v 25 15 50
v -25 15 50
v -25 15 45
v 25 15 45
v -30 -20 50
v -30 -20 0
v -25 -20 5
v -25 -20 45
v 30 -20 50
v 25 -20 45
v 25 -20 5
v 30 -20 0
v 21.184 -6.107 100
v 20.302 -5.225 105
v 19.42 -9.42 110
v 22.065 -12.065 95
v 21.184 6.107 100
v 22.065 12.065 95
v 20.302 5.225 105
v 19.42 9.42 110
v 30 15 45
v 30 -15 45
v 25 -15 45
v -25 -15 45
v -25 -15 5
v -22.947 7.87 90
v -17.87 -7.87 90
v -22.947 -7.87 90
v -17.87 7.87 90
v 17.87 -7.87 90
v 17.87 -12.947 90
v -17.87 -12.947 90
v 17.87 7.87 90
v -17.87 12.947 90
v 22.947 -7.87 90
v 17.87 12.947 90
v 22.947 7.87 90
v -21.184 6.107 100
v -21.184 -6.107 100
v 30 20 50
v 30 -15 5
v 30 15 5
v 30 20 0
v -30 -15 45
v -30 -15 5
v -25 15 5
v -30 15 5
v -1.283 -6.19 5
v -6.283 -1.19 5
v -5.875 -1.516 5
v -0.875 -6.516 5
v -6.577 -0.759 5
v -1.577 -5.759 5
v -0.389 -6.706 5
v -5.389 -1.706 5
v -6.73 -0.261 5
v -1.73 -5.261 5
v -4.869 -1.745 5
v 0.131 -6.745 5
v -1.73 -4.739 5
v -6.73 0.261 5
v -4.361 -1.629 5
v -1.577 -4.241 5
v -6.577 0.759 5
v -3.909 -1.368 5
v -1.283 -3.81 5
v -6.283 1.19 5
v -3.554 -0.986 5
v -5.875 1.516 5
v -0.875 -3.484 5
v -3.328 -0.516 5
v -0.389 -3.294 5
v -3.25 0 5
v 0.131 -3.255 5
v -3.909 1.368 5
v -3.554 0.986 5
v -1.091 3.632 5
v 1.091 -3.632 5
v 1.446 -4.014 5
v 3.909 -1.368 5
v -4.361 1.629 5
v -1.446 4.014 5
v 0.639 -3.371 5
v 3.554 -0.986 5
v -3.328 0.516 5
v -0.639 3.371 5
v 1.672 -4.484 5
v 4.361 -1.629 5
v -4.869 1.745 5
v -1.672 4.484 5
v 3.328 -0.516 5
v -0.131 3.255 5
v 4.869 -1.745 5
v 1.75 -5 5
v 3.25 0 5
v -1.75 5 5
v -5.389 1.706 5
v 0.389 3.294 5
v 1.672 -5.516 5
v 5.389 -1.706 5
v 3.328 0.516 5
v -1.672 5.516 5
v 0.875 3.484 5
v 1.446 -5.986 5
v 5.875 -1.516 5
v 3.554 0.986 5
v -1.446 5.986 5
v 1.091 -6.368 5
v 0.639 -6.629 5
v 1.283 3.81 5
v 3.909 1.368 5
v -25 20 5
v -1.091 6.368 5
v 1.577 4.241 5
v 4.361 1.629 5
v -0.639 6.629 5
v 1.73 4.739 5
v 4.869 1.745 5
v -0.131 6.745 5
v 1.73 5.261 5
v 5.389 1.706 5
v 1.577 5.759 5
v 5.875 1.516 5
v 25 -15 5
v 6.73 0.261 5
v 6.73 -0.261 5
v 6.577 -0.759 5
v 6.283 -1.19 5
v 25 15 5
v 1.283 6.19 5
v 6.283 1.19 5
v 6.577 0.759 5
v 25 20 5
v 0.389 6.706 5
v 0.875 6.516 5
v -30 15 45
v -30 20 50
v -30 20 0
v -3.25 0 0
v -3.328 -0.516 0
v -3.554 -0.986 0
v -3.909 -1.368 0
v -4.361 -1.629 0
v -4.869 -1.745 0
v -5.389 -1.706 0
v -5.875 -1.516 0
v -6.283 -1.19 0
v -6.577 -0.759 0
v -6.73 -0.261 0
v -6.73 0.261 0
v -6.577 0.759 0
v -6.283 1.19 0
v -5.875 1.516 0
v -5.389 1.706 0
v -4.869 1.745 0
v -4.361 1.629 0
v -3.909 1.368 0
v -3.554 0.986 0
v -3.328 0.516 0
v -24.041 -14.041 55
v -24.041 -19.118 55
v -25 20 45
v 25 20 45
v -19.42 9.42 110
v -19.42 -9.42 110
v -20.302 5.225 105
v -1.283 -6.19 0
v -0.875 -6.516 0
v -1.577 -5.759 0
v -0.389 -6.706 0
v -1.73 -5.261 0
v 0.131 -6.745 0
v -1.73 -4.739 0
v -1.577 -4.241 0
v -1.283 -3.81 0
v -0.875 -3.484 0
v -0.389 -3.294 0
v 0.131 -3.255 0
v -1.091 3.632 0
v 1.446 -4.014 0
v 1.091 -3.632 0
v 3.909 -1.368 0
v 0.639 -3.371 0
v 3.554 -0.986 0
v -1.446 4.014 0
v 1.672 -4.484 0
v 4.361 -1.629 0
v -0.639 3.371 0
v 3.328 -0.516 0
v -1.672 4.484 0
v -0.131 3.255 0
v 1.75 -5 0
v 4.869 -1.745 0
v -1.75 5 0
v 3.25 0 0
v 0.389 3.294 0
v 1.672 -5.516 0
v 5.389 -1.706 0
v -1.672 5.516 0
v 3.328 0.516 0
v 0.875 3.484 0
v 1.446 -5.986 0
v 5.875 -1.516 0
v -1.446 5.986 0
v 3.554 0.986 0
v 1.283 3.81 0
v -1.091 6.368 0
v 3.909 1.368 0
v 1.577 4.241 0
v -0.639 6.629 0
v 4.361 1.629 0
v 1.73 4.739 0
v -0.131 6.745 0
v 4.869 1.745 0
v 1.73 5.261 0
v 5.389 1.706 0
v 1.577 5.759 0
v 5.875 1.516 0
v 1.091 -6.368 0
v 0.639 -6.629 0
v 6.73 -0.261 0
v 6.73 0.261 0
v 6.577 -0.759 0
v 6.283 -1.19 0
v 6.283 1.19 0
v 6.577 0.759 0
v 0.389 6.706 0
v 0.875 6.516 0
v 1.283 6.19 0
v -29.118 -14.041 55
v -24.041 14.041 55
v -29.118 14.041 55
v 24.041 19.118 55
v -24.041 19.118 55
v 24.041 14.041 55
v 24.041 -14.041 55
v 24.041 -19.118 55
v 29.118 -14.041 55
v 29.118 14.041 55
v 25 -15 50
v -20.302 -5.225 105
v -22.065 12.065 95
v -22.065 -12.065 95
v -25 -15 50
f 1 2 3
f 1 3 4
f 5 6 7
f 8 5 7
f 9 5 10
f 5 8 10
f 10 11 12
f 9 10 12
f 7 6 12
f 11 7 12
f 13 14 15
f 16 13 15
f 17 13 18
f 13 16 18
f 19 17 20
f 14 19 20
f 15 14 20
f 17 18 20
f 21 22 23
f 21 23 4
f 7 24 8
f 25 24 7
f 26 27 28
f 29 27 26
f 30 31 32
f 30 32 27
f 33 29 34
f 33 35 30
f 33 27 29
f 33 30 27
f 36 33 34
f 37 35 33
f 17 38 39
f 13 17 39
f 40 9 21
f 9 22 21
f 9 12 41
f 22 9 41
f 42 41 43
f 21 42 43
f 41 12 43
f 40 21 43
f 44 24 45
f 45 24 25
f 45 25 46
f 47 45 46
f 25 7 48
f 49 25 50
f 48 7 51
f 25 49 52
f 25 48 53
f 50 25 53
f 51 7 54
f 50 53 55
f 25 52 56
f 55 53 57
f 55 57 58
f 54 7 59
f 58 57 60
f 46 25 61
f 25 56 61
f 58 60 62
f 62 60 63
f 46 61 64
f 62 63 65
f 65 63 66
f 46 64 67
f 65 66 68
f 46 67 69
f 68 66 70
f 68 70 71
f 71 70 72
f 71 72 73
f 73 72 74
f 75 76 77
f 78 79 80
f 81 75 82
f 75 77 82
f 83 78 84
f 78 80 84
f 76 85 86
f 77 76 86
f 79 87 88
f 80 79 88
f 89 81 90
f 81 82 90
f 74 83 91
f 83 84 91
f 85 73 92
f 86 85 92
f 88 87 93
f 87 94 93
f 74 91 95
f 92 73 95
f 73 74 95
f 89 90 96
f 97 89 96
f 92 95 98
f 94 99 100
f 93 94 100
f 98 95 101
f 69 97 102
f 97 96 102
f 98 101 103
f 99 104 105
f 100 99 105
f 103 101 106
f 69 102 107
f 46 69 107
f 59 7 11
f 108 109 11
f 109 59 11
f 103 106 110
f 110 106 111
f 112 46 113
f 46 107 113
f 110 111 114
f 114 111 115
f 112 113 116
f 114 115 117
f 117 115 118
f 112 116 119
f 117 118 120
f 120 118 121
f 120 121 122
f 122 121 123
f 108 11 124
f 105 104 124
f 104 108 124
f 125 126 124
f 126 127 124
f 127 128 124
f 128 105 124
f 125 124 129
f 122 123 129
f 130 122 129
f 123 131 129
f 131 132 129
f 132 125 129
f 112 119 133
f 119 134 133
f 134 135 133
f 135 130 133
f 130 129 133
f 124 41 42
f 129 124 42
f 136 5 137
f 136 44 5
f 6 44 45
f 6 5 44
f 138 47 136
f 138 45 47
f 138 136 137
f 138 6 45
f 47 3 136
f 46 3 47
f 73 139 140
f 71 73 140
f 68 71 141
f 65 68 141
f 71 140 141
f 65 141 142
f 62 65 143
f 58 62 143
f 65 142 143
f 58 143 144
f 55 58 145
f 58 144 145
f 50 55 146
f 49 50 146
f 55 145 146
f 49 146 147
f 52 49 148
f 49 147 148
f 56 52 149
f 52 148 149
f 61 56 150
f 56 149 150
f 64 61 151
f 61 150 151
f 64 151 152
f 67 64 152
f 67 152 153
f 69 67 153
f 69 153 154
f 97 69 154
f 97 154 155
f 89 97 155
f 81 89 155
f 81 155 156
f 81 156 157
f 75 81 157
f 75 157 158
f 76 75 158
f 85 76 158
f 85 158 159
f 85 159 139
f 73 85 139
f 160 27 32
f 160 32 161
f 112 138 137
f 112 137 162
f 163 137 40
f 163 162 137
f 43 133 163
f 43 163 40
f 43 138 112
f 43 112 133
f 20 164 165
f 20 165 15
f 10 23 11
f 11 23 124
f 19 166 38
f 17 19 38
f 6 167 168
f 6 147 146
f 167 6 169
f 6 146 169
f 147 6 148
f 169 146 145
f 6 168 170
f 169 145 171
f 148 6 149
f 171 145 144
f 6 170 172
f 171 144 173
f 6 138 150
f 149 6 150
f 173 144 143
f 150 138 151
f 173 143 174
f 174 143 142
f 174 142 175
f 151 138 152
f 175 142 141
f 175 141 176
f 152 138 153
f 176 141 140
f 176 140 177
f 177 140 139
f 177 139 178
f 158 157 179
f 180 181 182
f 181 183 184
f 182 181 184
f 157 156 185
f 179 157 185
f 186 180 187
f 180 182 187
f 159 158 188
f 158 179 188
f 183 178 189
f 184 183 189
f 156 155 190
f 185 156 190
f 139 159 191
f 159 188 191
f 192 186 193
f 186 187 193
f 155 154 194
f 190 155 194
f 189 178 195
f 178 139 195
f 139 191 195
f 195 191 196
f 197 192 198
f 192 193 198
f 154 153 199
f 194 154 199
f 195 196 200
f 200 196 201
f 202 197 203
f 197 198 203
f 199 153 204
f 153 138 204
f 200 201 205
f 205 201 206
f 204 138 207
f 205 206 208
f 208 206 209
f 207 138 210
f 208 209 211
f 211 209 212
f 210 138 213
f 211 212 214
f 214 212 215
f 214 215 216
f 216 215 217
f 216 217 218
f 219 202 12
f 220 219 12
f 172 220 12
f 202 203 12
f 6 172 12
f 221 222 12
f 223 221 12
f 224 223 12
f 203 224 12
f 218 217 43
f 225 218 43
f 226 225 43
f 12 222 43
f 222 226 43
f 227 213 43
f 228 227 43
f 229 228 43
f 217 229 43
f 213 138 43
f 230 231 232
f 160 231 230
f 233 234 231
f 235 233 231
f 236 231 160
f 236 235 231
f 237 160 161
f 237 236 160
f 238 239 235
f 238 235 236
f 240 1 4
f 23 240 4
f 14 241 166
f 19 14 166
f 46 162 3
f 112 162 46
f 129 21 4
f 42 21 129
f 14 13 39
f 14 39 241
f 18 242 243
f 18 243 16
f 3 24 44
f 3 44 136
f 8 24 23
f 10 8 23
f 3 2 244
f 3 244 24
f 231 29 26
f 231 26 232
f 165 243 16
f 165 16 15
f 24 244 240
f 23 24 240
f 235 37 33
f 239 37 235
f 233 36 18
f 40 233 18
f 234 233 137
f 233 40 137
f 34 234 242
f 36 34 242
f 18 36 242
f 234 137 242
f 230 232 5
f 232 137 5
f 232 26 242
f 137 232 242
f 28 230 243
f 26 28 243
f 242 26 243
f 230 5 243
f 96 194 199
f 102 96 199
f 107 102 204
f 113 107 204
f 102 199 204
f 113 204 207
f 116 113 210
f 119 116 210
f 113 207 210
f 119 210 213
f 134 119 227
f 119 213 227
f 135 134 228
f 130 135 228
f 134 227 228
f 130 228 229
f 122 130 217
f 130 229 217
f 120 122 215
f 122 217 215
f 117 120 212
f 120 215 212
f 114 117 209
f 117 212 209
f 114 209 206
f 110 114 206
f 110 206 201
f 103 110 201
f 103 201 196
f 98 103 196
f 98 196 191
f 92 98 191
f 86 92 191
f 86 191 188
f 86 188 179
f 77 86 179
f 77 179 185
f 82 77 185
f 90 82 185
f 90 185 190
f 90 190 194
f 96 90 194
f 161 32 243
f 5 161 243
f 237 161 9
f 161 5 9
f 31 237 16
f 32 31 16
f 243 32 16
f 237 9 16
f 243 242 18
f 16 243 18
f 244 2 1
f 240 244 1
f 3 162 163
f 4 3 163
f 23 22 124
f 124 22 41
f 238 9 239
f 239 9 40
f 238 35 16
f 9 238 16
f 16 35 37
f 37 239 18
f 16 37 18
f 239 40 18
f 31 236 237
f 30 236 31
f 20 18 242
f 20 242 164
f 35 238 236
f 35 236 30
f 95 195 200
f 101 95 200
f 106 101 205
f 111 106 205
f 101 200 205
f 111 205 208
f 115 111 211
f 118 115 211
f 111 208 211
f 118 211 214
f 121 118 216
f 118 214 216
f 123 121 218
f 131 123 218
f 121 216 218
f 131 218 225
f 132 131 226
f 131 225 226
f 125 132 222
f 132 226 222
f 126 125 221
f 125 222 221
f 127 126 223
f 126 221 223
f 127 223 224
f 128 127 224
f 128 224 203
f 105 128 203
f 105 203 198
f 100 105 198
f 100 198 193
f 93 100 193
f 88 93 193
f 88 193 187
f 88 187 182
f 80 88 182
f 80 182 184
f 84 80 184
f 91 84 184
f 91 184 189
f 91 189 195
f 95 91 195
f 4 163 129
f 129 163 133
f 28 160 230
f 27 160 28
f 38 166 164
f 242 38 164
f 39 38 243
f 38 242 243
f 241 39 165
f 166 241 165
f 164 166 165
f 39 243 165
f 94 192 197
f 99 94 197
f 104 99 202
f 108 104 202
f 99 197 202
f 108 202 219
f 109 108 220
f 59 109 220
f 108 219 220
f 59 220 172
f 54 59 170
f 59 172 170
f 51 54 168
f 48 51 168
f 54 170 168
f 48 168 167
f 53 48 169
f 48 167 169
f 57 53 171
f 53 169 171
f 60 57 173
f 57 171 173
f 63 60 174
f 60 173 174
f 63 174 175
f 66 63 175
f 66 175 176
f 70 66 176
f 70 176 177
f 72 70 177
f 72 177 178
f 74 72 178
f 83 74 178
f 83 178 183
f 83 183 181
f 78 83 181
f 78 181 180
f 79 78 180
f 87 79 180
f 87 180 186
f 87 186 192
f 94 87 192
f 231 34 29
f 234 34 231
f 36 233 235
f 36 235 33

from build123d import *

# Parameters (mm, degrees)
SKETCH1_W           = 60
SKETCH1_H           = 40
BOSS_EXTRUDE1_DEPTH = 50
SKETCH2_W           = 50
SKETCH2_H           = 30
CUT_EXTRUDE1_DEPTH  = 45
SKETCH3_W           = 50
SKETCH3_H           = 40
CUT_EXTRUDE2_DEPTH  = 45
SKETCH4_W           = 40
SKETCH4_H           = 30
CUT_EXTRUDE3_DEPTH  = 81.622577483
SKETCH5_W           = 60
SKETCH5_H           = 40
BOSS_EXTRUDE2_DEPTH = 45
BOSS_EXTRUDE2_TAPER = 10
CUT_EXTRUDE6_DEPTH  = 109.034251597
CUT_EXTRUDE7_DEPTH  = 114.321745988
SKETCH10_W          = 44.130571736
SKETCH10_H          = 24.130571736
BOSS_EXTRUDE3_DEPTH = 15
BOSS_EXTRUDE3_TAPER = 9.999999999
CUT_EXTRUDE8_DEPTH  = 114.321745988
SKETCH17_R          = 1.75
CUT_EXTRUDE10_DEPTH = 10


with BuildPart() as part:
    # Sketch1 → Boss-Extrude1 (new body)
    with BuildSketch(Plane.XY):
        Rectangle(SKETCH1_W, SKETCH1_H)
    extrude(amount=BOSS_EXTRUDE1_DEPTH)

    # Sketch2 → Cut-Extrude1 (cut)
    with BuildSketch(Plane.XY.offset(50)):
        Rectangle(SKETCH2_W, SKETCH2_H)
    extrude(amount=-CUT_EXTRUDE1_DEPTH, mode=Mode.SUBTRACT)

    # Sketch3 → Cut-Extrude2 (cut)
    with BuildSketch(Plane(origin=(0, 20, 0), x_dir=(1, 0, 0), z_dir=(0, 1, 0))):
        with Locations((0, -25)):
            Rectangle(SKETCH3_W, SKETCH3_H)
    extrude(amount=-CUT_EXTRUDE2_DEPTH, mode=Mode.SUBTRACT)

    # Sketch4 → Cut-Extrude3 (cut, through all)
    with BuildSketch(Plane(origin=(30, 0, 0), x_dir=(0, 0, -1), z_dir=(1, 0, 0))):
        with Locations((-25, 0)):
            Rectangle(SKETCH4_W, SKETCH4_H)
    extrude(amount=-CUT_EXTRUDE3_DEPTH, mode=Mode.SUBTRACT)

    # Sketch5 → Boss-Extrude2 (add)
    with BuildSketch(Plane.XY.offset(50)):
        Rectangle(SKETCH5_W, SKETCH5_H)
    extrude(amount=BOSS_EXTRUDE2_DEPTH, taper=BOSS_EXTRUDE2_TAPER)

    # Sketch6 → Cut-Extrude6 (cut, through all)
    with BuildSketch(Plane(origin=(0, 20, 95.767424097), x_dir=(1, 0, 0), z_dir=(0, -1, 0))):
        Polygon((-24.041232037, -40.767424097), (24.041232037, -40.767424097), (17.869787712, -5.767424097), (-17.869787712, -5.767424097), align=None)
    extrude(amount=CUT_EXTRUDE6_DEPTH, mode=Mode.SUBTRACT)

    # Sketch9 → Cut-Extrude7 (cut, through all)
    with BuildSketch(Plane(origin=(30, 0, 94.030942321), x_dir=(0, 0, 1), z_dir=(-1, 0, 0))):
        Polygon((-39.030942321, 14.041232037), (-39.030942321, -14.041232037), (-4.030942321, -7.869787712), (-4.030942321, 7.869787712), align=None)
    extrude(amount=CUT_EXTRUDE7_DEPTH, mode=Mode.SUBTRACT)

    # Sketch17 → Cut-Extrude10 (cut)
    with BuildSketch(Plane(origin=(0, 0, 0), x_dir=(-1, 0, 0), z_dir=(0, 0, -1))):
        with Locations((-5, 0)):
            Circle(SKETCH17_R)
        with Locations((0, 5)):
            Circle(SKETCH17_R)
        with Locations(Location((5, 0, 0), (0, 0, 180))):
            Circle(SKETCH17_R)
        with Locations(Location((0, -5, 0), (0, 0, 180))):
            Circle(SKETCH17_R)
    extrude(amount=-CUT_EXTRUDE10_DEPTH, mode=Mode.SUBTRACT)


with BuildPart() as body_2:
    # Sketch10 → Boss-Extrude3 (new body)
    with BuildSketch(Plane.XY.offset(95)):
        Rectangle(SKETCH10_W, SKETCH10_H)
    extrude(amount=BOSS_EXTRUDE3_DEPTH, taper=BOSS_EXTRUDE3_TAPER)

    # Sketch15 → Cut-Extrude8 (cut, through all)
    with BuildSketch(Plane(origin=(30, 0, 94.030942321), x_dir=(0, 0, 1), z_dir=(-1, 0, 0))):
        Polygon((5.969057679, 6.106517905), (5.969057679, -6.106517905), (10.969057679, -5.224883002), (10.969057679, 5.224883002), align=None)
    extrude(amount=CUT_EXTRUDE8_DEPTH, mode=Mode.SUBTRACT)


solid = Compound([part.part, body_2.part])
